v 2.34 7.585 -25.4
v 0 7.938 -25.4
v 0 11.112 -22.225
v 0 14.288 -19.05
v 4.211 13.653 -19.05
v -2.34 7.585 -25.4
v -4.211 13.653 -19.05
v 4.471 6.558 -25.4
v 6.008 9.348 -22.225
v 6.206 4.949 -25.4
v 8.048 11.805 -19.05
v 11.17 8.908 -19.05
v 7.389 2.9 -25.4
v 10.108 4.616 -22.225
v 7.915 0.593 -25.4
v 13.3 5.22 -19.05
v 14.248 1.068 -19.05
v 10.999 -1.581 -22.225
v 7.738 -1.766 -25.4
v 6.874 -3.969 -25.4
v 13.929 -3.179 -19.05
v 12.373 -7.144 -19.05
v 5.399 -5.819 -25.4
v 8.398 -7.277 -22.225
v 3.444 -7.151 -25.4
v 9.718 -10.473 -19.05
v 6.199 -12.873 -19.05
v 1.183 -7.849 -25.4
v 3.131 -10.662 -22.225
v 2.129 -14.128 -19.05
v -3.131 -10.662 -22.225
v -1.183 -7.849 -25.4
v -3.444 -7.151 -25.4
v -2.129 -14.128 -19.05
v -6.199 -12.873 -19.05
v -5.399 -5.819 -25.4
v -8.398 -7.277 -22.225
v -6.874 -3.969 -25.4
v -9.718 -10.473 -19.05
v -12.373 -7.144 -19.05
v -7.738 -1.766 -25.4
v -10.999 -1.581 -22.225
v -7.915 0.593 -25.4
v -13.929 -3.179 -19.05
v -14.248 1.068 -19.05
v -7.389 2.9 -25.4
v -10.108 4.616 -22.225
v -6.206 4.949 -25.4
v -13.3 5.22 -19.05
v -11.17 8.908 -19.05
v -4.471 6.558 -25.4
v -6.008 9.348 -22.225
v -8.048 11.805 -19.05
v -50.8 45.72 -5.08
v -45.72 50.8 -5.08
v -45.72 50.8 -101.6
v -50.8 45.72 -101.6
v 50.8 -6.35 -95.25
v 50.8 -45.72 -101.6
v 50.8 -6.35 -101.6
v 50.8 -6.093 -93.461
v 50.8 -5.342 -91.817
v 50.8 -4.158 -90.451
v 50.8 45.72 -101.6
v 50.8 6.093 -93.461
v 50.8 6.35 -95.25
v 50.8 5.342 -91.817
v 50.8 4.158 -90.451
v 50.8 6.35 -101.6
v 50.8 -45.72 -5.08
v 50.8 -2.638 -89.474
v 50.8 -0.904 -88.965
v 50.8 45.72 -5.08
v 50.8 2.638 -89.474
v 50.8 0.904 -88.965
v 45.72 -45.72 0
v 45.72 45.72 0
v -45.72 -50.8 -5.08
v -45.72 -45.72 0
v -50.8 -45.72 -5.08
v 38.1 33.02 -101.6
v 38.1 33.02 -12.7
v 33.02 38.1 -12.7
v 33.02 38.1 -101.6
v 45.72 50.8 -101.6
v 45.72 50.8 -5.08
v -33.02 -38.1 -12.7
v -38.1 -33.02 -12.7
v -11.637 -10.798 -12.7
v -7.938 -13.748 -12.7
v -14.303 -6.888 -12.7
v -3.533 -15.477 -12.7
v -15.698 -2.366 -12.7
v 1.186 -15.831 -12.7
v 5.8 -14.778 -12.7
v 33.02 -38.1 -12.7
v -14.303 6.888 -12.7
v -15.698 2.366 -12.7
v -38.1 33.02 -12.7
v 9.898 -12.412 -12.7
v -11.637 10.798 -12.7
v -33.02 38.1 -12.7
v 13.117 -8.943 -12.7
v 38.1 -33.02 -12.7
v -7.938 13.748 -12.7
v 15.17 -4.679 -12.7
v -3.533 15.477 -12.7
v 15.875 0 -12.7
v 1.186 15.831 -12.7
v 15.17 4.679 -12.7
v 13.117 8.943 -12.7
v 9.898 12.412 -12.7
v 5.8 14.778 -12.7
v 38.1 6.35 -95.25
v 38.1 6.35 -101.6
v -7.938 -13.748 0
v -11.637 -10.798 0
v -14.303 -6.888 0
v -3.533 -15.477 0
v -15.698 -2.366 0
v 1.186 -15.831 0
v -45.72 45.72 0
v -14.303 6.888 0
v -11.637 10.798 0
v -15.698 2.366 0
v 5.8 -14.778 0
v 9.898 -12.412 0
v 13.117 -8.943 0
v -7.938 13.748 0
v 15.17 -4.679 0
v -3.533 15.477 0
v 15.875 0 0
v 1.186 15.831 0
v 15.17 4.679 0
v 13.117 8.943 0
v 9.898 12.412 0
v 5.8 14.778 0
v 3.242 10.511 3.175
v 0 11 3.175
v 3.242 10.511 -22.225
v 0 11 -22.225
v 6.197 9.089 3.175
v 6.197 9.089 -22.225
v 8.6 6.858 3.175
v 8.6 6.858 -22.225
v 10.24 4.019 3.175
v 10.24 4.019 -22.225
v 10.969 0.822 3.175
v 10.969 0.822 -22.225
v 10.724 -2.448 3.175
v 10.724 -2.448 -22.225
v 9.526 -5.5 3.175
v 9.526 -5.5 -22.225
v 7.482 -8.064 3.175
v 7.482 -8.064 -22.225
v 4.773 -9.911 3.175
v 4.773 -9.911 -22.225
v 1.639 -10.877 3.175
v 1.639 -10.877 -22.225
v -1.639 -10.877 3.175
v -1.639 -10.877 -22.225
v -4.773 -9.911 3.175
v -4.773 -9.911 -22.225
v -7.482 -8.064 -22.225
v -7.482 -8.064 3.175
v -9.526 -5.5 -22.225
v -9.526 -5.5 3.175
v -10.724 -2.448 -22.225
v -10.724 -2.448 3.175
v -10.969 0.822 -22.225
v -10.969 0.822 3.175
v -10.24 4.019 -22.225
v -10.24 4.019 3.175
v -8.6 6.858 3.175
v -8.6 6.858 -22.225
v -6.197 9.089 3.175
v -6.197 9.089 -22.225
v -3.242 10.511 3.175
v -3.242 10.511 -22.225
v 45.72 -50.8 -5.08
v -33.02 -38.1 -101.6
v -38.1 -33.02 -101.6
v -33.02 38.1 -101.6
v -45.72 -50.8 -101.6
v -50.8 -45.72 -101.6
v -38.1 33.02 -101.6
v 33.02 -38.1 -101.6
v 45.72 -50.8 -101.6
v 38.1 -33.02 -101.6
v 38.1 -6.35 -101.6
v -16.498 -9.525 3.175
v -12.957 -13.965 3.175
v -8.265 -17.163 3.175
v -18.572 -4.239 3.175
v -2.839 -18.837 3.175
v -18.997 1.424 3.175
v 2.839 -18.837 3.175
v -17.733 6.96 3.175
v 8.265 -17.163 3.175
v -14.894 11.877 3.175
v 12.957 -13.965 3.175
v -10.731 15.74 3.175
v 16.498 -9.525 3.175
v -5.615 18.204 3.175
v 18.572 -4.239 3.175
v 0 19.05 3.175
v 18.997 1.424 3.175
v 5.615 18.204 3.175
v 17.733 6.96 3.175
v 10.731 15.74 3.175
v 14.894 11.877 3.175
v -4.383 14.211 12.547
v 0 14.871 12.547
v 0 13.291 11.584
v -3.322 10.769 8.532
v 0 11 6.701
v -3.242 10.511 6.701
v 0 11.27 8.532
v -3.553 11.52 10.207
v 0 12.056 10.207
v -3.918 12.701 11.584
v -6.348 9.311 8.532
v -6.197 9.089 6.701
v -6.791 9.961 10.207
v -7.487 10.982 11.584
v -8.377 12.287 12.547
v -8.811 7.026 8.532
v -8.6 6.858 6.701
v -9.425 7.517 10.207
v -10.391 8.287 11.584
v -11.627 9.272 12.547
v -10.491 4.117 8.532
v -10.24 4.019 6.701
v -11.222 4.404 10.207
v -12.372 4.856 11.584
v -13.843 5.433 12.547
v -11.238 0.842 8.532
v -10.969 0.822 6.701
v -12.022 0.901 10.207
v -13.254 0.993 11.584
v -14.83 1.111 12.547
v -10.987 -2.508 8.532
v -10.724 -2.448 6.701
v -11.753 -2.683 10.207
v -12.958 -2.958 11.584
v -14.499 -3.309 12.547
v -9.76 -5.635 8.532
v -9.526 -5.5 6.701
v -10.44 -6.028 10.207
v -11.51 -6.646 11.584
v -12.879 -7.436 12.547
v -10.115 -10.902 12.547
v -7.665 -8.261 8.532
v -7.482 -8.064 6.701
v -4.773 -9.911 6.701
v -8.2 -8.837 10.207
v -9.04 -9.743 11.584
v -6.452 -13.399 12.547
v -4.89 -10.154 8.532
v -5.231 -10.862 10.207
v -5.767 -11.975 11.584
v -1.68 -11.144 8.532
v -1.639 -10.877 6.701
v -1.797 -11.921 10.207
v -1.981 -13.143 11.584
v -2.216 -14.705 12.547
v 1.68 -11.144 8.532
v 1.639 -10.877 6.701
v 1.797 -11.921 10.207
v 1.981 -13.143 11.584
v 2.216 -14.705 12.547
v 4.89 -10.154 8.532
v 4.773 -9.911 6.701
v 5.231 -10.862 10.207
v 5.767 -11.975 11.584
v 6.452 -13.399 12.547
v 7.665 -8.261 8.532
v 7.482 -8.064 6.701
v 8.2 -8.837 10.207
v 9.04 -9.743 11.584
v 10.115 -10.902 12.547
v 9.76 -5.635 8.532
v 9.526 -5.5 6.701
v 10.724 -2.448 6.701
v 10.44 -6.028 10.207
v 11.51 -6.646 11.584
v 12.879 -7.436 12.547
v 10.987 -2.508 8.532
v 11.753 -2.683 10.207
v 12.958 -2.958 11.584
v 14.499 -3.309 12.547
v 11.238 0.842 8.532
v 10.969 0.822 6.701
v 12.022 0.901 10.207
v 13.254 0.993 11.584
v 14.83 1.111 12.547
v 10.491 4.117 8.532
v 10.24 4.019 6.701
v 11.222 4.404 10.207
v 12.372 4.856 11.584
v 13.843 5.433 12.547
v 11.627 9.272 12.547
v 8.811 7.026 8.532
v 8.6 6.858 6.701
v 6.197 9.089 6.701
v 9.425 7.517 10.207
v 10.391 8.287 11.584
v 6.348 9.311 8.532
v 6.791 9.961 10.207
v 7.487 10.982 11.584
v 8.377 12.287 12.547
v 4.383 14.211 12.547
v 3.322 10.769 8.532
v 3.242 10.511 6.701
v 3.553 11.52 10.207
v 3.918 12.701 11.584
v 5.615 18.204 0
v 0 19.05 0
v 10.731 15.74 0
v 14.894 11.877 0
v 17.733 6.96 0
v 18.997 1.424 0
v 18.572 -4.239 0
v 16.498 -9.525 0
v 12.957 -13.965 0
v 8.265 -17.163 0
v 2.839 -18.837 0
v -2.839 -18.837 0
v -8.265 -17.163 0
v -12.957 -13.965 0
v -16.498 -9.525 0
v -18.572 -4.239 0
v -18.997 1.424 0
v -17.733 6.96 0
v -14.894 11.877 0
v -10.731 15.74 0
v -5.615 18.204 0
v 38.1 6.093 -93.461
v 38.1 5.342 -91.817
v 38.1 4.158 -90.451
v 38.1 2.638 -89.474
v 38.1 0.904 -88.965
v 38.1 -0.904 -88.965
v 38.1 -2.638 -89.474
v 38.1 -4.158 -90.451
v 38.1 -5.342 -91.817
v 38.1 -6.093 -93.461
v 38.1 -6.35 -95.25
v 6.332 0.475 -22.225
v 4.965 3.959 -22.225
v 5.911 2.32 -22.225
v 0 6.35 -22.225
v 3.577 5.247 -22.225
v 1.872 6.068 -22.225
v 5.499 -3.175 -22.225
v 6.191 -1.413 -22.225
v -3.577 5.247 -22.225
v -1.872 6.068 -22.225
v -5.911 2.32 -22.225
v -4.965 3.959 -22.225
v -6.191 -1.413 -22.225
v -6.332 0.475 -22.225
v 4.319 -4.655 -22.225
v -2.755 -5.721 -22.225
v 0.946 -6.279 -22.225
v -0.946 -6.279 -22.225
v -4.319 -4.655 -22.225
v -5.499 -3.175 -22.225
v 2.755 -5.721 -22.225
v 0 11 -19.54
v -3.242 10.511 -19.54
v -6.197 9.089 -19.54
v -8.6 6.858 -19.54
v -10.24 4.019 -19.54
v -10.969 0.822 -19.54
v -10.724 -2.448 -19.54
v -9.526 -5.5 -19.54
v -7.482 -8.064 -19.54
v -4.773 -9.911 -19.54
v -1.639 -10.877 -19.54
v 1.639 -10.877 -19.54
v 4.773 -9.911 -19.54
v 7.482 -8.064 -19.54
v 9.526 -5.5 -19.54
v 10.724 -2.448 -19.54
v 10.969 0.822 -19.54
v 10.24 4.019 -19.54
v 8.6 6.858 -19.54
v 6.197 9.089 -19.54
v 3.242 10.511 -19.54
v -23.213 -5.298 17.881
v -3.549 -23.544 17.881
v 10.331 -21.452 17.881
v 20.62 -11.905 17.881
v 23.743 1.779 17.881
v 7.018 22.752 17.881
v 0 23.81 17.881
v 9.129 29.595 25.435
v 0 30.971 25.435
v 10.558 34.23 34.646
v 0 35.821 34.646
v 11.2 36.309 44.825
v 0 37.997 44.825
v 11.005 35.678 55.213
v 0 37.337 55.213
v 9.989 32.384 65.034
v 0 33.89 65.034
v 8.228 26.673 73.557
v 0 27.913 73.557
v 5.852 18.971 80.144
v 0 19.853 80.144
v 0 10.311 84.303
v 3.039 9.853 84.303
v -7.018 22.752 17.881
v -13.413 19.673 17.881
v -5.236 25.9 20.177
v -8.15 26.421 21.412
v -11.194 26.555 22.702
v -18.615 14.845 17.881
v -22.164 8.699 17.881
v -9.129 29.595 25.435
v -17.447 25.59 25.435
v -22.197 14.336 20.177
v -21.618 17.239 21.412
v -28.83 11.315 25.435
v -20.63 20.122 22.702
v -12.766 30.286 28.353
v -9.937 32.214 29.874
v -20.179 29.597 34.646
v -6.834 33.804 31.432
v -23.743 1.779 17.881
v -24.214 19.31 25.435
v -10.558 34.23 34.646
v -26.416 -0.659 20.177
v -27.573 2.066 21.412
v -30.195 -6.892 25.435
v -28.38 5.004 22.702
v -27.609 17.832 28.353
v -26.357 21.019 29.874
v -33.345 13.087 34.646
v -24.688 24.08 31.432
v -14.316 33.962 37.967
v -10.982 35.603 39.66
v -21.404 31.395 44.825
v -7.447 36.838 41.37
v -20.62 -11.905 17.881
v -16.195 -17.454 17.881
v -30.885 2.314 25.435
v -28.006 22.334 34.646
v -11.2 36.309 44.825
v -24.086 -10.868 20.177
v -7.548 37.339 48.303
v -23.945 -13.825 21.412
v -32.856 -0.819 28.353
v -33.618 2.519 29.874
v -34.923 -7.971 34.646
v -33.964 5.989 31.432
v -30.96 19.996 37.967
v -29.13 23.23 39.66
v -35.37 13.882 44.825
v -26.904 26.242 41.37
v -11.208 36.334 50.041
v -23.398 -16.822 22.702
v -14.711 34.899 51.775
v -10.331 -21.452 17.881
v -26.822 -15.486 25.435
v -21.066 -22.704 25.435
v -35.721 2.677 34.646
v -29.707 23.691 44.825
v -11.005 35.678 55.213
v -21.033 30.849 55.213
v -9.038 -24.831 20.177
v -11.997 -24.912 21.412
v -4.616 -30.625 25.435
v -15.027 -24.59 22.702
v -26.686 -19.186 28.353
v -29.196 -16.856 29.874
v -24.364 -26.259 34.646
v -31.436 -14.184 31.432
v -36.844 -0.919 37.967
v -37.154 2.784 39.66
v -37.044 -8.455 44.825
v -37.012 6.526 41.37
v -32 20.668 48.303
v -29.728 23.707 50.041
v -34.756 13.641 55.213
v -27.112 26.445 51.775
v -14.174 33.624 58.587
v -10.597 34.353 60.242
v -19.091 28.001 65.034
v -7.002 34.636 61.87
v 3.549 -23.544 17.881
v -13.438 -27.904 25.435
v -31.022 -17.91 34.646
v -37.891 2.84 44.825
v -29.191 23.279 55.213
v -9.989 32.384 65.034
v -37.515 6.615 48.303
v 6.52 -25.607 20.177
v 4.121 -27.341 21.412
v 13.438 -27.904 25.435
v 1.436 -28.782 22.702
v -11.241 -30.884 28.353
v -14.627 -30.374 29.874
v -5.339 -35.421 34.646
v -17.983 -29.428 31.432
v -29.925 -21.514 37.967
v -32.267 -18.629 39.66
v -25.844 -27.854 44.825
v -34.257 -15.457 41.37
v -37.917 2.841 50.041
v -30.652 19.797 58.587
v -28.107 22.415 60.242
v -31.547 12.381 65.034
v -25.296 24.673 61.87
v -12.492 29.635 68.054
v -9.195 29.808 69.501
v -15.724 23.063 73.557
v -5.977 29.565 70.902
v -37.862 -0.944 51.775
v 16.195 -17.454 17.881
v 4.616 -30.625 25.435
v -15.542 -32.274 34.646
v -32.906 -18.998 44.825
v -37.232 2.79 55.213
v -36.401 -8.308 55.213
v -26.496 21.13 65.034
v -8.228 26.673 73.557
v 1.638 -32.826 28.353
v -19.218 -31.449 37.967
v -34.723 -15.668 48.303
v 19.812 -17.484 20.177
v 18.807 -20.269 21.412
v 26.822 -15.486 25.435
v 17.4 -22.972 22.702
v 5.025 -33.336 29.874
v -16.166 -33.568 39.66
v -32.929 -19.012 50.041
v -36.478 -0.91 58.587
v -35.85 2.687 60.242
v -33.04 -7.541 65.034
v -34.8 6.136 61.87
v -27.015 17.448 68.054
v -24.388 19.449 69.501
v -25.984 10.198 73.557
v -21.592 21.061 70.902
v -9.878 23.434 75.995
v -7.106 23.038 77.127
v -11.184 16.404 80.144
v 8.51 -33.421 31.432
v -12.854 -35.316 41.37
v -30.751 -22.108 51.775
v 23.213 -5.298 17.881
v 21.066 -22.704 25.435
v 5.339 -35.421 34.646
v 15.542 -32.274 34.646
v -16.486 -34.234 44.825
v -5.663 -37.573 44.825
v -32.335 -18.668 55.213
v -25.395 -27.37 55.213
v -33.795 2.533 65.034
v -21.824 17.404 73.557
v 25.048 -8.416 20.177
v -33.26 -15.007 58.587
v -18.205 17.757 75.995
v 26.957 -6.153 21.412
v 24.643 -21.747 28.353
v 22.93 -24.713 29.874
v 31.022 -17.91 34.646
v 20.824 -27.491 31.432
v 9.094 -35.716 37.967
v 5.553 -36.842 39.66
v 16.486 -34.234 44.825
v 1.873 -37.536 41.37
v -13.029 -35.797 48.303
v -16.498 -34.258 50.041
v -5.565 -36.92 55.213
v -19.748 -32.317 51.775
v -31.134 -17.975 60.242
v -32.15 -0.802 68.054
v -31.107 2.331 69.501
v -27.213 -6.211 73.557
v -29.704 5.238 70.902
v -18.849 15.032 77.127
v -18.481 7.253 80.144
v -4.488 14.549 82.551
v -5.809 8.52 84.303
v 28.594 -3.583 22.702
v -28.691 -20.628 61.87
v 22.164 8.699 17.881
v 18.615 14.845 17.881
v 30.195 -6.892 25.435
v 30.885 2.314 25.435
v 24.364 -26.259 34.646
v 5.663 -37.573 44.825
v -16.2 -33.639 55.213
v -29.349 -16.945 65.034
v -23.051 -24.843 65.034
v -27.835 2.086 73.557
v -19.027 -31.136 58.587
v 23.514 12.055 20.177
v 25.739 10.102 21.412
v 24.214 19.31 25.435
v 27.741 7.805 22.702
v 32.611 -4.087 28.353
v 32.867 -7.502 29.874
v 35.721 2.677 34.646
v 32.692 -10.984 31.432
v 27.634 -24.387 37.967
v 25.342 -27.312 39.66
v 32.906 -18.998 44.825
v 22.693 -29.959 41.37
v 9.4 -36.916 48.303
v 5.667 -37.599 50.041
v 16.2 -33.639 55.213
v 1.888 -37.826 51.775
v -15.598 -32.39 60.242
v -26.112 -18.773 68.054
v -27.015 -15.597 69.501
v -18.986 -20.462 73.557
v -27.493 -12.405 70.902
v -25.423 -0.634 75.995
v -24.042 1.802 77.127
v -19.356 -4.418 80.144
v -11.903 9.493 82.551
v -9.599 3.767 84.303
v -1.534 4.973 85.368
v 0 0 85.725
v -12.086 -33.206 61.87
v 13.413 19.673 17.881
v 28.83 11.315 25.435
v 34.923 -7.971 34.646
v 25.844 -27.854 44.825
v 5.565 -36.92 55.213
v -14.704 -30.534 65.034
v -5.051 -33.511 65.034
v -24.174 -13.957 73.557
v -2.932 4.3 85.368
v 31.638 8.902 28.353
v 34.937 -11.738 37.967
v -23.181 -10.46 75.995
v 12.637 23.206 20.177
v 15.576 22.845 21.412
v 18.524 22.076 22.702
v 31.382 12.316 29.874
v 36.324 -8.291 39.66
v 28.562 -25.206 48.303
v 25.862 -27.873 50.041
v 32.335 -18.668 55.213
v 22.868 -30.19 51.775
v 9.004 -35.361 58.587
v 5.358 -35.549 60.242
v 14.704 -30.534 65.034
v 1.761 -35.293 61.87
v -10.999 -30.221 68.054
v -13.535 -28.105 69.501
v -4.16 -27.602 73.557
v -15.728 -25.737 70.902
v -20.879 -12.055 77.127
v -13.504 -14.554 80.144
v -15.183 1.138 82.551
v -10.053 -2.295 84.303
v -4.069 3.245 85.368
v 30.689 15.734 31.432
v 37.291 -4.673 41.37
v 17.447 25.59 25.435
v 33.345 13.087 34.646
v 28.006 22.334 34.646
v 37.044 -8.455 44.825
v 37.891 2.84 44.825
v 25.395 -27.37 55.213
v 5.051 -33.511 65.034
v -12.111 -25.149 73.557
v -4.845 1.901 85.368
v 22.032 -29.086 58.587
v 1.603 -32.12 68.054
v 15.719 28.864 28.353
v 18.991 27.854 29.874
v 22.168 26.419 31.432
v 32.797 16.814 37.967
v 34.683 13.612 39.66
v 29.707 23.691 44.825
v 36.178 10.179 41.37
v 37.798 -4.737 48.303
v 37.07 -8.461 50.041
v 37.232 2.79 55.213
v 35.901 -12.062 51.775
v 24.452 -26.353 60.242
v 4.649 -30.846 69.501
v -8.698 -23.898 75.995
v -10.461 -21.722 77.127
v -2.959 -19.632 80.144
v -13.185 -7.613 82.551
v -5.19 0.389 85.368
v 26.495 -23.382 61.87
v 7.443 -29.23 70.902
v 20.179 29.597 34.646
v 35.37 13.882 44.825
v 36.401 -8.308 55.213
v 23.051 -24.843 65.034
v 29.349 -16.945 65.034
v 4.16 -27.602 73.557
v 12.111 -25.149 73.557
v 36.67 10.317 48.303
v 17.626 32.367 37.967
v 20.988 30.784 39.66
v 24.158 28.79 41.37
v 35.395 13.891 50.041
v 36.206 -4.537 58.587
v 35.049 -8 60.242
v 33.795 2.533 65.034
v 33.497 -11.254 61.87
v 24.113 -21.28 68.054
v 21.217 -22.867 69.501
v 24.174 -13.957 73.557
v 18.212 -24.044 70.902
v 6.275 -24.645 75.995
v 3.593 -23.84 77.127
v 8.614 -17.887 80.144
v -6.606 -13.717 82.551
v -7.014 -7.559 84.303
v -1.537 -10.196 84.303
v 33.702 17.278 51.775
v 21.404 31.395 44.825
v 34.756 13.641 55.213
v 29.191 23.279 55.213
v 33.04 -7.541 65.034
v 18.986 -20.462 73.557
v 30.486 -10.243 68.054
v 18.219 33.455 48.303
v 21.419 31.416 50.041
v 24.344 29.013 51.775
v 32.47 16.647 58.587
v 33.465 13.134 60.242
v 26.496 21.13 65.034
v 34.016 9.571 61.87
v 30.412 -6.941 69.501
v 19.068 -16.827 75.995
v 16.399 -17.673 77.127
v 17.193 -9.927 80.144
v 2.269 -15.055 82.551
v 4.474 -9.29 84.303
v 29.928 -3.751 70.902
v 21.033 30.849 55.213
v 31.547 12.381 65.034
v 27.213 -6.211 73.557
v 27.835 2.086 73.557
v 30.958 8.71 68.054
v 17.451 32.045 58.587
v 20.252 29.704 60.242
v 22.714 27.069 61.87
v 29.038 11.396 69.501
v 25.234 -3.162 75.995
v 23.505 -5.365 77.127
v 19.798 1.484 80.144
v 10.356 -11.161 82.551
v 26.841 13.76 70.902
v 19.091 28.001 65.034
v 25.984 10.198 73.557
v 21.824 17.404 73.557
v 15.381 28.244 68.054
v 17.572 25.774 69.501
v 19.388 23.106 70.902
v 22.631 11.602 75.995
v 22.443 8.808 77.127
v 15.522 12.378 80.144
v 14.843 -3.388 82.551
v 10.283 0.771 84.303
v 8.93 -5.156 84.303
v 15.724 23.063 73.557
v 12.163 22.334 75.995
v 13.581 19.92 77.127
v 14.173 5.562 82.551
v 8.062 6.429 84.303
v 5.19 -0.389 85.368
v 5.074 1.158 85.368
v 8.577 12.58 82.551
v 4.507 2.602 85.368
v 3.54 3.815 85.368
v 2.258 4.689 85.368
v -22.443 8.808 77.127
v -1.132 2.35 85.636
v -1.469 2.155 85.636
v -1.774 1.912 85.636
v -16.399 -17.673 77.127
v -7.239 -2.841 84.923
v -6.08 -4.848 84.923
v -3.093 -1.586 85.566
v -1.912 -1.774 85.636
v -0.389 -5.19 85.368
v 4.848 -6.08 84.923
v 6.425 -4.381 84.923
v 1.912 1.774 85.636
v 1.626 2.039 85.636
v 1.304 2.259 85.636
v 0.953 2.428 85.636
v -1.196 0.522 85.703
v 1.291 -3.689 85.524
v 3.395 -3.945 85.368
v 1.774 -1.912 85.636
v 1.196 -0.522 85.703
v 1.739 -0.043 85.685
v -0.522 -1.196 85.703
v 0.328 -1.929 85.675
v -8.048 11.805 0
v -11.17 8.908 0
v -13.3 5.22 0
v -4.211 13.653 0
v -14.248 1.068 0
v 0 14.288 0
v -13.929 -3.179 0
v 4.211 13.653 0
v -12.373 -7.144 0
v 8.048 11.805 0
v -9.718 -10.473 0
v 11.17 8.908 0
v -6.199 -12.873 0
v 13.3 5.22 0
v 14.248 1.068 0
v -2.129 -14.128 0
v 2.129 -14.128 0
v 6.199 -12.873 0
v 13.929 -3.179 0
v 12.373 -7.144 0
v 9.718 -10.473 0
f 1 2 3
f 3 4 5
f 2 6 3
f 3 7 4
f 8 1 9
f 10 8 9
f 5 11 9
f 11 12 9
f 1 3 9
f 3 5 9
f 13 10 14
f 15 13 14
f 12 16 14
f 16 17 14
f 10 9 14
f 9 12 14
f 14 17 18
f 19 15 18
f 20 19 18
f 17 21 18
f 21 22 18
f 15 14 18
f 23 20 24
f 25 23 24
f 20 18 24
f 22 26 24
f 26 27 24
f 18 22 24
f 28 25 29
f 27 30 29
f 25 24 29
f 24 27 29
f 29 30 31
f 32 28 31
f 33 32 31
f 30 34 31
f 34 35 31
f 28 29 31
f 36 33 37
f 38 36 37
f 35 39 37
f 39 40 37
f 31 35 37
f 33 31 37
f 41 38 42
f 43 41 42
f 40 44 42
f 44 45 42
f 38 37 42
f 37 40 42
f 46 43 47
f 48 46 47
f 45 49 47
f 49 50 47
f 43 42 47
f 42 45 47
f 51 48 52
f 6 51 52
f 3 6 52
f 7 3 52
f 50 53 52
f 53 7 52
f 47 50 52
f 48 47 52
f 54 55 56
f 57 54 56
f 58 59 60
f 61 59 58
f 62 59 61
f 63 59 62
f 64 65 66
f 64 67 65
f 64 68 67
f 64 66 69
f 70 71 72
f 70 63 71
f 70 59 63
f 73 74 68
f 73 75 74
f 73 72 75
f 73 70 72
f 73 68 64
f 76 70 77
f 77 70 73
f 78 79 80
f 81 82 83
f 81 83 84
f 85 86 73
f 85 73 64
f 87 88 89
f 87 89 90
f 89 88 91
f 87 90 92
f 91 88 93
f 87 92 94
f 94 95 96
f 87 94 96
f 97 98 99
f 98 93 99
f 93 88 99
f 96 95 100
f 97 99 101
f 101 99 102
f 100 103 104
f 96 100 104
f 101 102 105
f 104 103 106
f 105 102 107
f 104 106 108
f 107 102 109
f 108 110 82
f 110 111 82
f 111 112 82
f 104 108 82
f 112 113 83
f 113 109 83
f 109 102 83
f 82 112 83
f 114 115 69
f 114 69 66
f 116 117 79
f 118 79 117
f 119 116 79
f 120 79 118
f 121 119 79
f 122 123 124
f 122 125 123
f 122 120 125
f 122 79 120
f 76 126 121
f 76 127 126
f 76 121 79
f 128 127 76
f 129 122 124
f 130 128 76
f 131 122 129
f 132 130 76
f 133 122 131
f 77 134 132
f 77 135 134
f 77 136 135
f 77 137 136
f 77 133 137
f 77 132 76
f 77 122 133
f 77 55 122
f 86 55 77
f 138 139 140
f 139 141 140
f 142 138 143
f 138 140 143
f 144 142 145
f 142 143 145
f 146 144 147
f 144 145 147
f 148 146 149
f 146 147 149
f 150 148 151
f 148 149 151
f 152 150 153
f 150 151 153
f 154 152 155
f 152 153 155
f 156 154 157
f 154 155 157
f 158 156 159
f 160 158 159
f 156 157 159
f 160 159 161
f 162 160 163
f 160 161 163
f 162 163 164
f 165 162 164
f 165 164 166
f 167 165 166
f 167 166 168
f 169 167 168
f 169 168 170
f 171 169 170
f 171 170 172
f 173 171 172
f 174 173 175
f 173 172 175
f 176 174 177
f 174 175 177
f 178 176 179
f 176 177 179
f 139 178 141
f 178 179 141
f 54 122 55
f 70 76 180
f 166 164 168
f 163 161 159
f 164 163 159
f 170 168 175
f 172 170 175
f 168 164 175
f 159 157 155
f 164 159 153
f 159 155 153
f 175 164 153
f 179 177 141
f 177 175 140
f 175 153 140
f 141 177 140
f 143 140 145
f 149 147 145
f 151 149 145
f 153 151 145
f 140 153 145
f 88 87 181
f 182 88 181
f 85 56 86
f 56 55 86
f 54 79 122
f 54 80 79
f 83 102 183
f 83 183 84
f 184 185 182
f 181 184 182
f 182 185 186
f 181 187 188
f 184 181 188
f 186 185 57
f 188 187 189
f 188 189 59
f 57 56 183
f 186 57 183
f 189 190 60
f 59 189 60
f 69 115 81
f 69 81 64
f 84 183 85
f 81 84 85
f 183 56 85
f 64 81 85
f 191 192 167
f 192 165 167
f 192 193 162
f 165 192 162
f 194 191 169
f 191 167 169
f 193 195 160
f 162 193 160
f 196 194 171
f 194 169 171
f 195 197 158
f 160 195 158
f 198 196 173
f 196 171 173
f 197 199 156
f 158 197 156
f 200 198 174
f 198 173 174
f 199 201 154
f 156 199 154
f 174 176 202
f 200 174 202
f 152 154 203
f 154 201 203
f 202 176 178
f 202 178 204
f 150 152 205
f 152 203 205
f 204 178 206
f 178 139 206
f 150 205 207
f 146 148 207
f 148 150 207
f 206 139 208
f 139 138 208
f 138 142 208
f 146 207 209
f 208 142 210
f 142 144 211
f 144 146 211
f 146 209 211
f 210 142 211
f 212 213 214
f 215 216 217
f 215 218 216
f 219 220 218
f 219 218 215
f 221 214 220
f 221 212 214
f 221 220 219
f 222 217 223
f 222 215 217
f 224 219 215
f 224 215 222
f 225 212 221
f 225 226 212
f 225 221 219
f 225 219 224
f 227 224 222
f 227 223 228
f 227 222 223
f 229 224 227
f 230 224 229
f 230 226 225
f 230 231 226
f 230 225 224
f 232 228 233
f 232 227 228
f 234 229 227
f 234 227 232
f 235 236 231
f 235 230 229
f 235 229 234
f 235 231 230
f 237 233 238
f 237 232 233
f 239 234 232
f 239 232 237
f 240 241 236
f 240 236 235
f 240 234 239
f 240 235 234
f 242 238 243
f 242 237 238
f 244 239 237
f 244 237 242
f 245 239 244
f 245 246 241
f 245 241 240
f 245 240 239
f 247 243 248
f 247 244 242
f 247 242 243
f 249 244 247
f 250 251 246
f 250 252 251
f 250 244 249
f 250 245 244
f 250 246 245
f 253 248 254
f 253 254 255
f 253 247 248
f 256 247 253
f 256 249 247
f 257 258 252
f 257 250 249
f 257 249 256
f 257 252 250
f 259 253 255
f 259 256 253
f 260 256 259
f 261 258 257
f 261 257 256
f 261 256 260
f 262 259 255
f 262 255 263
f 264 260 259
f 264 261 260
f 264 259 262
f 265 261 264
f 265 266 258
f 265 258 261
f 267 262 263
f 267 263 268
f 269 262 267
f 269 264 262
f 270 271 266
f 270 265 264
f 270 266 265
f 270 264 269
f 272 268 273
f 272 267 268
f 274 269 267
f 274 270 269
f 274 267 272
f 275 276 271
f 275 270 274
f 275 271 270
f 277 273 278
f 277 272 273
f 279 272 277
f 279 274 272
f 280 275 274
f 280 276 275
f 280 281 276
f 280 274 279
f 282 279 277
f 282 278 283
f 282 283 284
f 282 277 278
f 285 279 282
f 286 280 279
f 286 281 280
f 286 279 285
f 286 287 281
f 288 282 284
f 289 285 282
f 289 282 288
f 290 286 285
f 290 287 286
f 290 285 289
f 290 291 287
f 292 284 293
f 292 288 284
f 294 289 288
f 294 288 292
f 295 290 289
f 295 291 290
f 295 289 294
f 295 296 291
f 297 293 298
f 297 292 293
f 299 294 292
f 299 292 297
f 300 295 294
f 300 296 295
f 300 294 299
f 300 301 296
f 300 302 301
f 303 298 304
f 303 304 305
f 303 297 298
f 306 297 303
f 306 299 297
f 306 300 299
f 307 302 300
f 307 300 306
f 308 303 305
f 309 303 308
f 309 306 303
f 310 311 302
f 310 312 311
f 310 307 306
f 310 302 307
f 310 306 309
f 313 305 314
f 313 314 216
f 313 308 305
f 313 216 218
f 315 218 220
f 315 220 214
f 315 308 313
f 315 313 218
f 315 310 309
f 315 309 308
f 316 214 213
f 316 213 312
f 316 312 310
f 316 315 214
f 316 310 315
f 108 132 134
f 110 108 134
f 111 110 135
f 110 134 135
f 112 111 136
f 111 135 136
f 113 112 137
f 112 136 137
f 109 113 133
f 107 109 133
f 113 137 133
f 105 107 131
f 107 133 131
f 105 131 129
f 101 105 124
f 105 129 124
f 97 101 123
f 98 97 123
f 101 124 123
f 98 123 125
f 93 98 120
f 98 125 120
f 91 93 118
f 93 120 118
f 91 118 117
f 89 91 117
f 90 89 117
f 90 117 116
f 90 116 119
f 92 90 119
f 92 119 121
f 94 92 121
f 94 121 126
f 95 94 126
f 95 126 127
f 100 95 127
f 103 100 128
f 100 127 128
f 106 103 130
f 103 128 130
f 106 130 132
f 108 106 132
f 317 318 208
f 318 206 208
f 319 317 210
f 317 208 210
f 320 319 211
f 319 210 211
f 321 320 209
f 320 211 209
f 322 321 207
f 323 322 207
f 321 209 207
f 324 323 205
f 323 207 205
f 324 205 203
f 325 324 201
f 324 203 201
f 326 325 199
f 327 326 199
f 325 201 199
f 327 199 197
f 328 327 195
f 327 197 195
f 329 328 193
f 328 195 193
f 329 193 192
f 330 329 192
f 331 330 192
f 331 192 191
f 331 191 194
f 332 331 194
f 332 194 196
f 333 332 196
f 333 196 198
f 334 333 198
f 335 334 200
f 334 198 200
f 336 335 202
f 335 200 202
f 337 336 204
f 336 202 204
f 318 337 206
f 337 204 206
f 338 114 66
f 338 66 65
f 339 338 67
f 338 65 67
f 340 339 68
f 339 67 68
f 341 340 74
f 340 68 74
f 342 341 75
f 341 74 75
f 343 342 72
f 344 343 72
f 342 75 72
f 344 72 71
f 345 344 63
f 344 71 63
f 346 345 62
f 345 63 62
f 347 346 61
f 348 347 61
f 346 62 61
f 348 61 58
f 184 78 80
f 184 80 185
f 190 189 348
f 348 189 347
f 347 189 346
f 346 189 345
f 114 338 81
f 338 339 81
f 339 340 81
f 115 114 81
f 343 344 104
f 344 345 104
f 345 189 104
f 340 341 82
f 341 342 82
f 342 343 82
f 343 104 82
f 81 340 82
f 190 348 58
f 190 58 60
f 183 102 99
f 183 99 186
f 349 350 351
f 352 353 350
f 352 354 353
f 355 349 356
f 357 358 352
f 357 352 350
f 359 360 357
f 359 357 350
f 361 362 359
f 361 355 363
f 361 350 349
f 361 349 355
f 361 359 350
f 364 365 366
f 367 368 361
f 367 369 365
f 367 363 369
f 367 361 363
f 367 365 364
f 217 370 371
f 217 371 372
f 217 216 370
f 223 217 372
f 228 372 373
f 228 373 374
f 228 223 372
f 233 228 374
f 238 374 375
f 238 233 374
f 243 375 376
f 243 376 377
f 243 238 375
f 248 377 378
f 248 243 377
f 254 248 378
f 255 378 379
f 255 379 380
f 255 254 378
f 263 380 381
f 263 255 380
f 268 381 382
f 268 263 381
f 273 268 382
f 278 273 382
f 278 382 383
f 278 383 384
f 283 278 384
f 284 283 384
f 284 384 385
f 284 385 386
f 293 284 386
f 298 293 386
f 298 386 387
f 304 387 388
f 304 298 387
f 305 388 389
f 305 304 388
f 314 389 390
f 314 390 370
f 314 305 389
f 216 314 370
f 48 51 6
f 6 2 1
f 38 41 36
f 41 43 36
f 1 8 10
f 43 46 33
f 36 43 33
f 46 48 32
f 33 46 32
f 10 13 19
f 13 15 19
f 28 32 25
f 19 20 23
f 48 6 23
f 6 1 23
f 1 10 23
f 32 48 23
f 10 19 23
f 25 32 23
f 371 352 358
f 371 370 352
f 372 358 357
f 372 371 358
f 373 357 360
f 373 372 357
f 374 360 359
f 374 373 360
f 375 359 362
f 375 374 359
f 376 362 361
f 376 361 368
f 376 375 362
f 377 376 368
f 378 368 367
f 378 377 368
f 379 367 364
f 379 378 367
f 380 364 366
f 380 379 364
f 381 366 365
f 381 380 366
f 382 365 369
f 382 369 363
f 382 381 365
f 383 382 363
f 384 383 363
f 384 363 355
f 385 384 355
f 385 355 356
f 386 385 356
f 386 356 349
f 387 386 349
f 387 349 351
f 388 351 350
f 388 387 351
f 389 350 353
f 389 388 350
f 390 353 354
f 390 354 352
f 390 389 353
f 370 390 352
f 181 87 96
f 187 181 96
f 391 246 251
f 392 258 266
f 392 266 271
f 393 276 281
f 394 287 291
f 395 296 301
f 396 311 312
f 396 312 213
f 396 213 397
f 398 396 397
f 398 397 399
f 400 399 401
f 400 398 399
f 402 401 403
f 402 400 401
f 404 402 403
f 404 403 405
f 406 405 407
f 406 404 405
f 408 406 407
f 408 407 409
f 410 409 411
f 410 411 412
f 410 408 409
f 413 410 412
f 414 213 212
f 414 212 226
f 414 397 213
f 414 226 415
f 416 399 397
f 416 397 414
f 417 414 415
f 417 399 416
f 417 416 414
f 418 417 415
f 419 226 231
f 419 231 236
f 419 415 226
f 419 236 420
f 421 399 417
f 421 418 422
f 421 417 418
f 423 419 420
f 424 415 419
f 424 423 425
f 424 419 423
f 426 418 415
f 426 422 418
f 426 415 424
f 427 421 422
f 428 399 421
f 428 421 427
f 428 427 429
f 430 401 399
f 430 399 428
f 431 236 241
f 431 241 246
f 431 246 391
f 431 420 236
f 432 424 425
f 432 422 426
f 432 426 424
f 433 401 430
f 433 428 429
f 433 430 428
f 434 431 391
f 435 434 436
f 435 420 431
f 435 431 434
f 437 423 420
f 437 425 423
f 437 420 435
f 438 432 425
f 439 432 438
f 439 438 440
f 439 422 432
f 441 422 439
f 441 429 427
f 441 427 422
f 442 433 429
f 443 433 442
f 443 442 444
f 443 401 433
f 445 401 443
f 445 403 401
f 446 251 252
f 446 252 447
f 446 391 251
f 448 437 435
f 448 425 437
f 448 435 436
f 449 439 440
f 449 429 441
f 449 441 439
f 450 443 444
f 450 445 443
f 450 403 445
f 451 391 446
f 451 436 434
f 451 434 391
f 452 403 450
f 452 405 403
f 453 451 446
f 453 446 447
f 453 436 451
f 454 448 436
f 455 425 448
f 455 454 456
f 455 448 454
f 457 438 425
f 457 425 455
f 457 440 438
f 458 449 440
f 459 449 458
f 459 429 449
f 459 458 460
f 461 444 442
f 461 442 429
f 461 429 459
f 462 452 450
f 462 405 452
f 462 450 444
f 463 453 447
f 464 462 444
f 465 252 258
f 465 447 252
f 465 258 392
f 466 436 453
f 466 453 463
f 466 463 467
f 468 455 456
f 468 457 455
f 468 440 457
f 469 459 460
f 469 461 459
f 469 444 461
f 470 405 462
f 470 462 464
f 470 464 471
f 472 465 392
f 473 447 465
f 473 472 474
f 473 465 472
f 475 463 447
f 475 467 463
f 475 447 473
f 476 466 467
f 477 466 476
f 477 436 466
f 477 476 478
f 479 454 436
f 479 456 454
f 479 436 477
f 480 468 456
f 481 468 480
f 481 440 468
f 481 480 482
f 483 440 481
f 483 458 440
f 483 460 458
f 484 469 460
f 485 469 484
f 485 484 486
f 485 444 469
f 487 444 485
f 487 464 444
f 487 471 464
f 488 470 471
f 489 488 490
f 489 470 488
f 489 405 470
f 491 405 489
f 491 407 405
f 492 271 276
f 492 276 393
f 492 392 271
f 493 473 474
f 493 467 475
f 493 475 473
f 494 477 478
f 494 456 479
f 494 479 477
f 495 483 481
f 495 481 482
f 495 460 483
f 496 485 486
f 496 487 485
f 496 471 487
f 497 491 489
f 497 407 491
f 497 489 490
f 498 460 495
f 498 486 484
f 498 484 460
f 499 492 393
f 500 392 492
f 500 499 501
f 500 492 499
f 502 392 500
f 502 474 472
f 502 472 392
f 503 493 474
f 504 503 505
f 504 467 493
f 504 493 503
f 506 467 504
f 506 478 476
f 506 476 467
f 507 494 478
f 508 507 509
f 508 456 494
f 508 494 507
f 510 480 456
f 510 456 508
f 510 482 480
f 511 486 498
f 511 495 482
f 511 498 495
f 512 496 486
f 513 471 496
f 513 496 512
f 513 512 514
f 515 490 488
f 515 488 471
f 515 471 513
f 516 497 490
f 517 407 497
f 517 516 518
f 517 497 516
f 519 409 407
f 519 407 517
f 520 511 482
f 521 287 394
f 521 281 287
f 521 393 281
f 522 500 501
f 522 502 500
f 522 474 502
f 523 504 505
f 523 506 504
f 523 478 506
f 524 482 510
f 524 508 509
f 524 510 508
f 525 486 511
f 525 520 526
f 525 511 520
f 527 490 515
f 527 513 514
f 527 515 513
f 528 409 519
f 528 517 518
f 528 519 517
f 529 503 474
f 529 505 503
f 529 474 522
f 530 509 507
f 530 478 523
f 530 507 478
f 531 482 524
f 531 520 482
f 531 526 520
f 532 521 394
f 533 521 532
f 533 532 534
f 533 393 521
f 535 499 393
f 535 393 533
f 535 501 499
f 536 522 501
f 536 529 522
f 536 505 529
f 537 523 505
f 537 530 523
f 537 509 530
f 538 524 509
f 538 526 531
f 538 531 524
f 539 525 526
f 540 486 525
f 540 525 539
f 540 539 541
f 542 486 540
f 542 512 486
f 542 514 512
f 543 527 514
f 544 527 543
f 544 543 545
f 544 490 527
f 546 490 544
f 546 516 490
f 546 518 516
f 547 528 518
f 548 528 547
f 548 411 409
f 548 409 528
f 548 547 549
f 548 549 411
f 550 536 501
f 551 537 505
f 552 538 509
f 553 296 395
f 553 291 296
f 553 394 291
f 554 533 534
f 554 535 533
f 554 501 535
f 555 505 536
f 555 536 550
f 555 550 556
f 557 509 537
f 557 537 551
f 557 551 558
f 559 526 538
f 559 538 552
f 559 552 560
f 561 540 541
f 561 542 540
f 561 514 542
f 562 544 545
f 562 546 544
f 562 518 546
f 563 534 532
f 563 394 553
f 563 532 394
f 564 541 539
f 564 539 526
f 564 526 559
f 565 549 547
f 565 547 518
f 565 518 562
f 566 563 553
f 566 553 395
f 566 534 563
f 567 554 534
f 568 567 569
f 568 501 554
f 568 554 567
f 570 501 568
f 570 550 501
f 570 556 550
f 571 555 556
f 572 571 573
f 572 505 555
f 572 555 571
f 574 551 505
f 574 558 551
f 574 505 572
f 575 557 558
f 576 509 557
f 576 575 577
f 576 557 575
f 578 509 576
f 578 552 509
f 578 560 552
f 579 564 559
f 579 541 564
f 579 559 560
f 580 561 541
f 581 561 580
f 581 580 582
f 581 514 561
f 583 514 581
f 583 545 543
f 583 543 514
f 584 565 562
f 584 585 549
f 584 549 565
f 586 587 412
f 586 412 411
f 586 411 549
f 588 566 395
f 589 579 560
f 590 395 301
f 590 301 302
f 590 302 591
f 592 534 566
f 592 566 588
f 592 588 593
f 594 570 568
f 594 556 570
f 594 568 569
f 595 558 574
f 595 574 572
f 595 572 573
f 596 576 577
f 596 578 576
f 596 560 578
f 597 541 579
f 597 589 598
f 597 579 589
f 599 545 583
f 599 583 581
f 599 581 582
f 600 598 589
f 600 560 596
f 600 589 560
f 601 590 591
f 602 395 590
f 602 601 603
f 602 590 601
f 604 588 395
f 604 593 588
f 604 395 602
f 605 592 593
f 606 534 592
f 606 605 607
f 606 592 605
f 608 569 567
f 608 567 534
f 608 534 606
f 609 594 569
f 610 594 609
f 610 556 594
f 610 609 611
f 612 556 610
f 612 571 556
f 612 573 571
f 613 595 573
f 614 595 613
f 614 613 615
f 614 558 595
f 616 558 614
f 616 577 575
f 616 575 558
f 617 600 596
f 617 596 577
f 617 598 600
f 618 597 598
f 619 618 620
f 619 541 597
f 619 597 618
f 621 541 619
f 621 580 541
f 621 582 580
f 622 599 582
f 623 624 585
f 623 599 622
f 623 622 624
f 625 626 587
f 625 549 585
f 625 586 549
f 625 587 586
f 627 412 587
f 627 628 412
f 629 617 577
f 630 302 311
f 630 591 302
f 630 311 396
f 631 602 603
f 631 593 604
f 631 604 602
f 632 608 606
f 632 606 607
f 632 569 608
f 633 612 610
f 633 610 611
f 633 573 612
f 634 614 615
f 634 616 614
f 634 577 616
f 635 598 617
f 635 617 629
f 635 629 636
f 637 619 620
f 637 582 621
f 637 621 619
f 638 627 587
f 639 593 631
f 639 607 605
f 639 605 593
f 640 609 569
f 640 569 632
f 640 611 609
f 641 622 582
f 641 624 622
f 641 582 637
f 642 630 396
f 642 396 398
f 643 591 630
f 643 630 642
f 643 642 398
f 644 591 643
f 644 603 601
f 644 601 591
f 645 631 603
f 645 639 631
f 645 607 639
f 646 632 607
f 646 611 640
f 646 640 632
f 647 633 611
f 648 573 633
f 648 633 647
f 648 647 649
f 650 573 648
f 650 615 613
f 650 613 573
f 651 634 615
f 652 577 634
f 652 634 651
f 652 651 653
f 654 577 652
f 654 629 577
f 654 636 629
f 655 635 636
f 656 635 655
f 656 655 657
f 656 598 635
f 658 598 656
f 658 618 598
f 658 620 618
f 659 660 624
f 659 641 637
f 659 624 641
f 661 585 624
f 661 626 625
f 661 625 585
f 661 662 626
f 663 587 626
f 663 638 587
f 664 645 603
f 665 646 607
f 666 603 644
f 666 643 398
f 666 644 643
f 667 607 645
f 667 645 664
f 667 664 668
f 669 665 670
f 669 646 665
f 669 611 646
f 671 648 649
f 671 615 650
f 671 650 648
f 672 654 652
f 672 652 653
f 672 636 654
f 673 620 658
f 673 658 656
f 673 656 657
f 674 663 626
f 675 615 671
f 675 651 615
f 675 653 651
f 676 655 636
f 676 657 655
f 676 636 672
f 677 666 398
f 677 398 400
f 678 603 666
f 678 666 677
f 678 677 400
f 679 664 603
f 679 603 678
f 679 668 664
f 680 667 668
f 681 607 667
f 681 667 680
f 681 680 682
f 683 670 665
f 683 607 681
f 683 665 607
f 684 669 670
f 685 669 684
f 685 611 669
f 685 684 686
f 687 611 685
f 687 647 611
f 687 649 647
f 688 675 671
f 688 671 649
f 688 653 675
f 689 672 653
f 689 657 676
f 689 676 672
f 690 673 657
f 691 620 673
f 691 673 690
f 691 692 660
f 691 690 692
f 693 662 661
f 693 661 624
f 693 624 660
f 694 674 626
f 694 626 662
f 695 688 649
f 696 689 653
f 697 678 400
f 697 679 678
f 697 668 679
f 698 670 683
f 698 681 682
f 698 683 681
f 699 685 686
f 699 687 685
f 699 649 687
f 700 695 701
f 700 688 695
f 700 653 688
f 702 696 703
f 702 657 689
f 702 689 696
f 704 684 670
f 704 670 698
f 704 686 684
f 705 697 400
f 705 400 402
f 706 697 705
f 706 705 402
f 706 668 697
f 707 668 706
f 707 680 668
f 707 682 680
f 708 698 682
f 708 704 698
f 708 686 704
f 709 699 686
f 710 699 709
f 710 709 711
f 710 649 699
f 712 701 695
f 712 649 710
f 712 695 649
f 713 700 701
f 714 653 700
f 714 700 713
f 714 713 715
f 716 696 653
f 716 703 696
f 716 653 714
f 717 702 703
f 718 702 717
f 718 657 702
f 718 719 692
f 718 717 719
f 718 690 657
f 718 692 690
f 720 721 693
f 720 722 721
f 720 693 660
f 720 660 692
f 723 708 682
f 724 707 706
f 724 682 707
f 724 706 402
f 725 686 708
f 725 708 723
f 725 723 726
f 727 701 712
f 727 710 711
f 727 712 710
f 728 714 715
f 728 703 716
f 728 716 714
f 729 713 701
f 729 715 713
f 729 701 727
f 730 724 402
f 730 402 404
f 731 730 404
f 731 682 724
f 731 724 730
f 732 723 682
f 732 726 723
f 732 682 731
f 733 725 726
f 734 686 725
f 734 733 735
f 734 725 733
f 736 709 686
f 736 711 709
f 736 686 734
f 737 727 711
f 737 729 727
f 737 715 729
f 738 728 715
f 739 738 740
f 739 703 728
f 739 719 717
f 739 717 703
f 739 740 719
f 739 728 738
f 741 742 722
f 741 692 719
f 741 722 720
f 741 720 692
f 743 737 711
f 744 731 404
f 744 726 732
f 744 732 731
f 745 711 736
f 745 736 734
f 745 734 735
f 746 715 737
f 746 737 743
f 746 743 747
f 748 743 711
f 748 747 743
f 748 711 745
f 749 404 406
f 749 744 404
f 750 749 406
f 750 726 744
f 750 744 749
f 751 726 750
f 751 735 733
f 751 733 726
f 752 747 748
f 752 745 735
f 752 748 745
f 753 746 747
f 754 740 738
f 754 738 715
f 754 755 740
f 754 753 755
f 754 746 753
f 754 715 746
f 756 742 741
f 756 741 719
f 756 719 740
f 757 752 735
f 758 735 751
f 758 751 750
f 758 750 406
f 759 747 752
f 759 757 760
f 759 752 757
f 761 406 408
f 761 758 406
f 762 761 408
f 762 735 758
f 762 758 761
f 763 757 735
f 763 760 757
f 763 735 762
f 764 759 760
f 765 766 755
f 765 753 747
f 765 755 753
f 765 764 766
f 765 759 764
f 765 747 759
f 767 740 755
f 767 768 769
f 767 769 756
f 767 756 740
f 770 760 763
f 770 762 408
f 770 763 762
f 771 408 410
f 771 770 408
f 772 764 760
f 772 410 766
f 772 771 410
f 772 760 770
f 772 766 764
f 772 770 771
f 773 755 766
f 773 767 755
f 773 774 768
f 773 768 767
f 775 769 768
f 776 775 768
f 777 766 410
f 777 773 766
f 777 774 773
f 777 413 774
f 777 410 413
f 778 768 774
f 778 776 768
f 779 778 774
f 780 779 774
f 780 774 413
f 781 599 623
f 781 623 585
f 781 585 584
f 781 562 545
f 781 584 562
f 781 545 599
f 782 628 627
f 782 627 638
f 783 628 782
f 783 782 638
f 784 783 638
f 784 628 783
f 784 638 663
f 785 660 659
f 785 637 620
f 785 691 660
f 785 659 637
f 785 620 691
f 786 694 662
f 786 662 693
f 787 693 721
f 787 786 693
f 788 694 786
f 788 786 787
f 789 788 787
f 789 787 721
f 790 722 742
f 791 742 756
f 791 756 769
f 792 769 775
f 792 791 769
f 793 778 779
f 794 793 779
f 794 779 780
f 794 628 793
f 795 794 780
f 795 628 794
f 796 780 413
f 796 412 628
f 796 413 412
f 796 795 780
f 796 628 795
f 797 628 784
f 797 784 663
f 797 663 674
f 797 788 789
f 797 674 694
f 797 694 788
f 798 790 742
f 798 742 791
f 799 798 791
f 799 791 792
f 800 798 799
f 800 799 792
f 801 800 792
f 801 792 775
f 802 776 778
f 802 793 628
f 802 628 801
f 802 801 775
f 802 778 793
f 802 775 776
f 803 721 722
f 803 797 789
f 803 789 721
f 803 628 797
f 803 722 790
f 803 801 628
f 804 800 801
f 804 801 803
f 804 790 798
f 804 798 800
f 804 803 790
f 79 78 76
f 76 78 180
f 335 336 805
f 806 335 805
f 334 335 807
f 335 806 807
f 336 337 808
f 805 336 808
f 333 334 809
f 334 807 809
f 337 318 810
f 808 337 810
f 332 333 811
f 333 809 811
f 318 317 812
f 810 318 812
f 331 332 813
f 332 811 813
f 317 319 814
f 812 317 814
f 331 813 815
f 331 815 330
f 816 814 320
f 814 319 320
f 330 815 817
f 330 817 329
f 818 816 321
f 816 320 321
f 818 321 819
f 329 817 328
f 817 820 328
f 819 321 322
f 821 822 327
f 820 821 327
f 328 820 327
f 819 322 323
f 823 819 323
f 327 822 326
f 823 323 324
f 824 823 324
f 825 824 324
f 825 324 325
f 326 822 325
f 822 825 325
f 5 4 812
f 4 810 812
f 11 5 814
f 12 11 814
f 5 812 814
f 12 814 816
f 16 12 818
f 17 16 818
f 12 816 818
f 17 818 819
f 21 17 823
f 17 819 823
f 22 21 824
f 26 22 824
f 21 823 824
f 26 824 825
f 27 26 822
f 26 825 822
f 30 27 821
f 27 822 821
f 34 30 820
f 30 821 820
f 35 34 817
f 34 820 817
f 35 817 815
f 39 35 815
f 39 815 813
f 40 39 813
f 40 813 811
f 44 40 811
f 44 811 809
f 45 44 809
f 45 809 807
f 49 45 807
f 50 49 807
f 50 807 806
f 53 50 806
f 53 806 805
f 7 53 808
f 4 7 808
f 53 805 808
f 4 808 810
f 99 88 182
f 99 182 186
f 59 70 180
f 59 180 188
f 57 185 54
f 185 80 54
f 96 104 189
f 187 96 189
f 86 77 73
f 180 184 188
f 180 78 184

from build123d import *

# Parameters (mm, degrees)
F0_W     = 101.6
F0_H     = 101.6
F0_W_2   = 76.2
F0_H_2   = 76.2
F1_DEPTH = 101.6
F2_W     = 76.2
F2_H     = 76.2
F2_R     = 15.875
F3_DEPTH = 12.7
F5_DEPTH = 12.7
F10_SIZE = 5.08


with BuildPart() as f1:
    # F0 (on Top) → F1 (new body)
    with BuildSketch(Plane.XY):
        Rectangle(F0_W, F0_H)
        Rectangle(F0_W_2, F0_H_2, mode=Mode.SUBTRACT)
    extrude(amount=-F1_DEPTH)

    # F2 (on Top) → F3 (join)
    with BuildSketch(Plane.XY):
        Rectangle(F2_W, F2_H)
        Circle(F2_R, mode=Mode.SUBTRACT)
    extrude(amount=-F3_DEPTH)

    # F4 (on face) → F5 (cut, through all)
    with BuildSketch(Plane.YZ.offset(50.8)):
        with BuildLine():
            Line((-6.35, -95.25), (-6.35, -101.6))
            Line((-6.35, -101.6), (6.35, -101.6))
            Line((6.35, -101.6), (6.35, -95.25))
            ThreePointArc((6.35, -95.25), (0, -88.9), (-6.35, -95.25))
        make_face()
    extrude(amount=-F5_DEPTH, mode=Mode.SUBTRACT)

    # F10
    f10_edges = [f1.edges().sort_by_distance(p)[0] for p in [
        (-50.8, 0, 0),
        (0, -50.8, 0),
        (50.8, 0, 0),
        (0, 50.8, 0),
        (-50.8, -50.8, -50.8),
        (50.8, -50.8, -50.8),
        (-50.8, 50.8, -50.8),
        (50.8, 50.8, -50.8),
        (38.1, -38.1, -57.15),
        (-38.1, -38.1, -57.15),
        (38.1, 38.1, -57.15),
        (-38.1, 38.1, -57.15),
    ]]
    chamfer(f10_edges, length=F10_SIZE)


with BuildPart() as f7:
    # F6 (on Right) → F7 (revolve)
    with BuildSketch(Plane.YZ):
        Polygon((11, -22.225), (0, -22.225), (0, -25.4), (7.9375, -25.4), (14.2875, -19.05), (14.2875, 0), (19.05, 0), (19.05, 3.175), (11, 3.175), align=None)
    revolve(axis=Axis((0, 0, -12.7), (0, 0, -1)))


with BuildPart() as f9:
    # F8 (on Right) → F9 (revolve)
    with BuildSketch(Plane.YZ):
        with BuildLine():
            ThreePointArc((11, 6.700924), (12.055596, 10.206888), (14.871429, 12.547221))
            ThreePointArc((14.871429, 12.547221), (37.336801, 55.212707), (0, 85.725))
            Line((0, 85.725), (0, 9.525))
            Line((0, 9.525), (0, -22.225))
            Line((0, -22.225), (6.35, -22.225))
            Line((6.35, -22.225), (11, -19.540321))
            Line((11, -19.540321), (11, 6.700924))
        make_face()
    revolve(axis=Axis((0, 0, 47.625), (0, 0, 1)))


solid = Compound([f1.part, f7.part, f9.part])
